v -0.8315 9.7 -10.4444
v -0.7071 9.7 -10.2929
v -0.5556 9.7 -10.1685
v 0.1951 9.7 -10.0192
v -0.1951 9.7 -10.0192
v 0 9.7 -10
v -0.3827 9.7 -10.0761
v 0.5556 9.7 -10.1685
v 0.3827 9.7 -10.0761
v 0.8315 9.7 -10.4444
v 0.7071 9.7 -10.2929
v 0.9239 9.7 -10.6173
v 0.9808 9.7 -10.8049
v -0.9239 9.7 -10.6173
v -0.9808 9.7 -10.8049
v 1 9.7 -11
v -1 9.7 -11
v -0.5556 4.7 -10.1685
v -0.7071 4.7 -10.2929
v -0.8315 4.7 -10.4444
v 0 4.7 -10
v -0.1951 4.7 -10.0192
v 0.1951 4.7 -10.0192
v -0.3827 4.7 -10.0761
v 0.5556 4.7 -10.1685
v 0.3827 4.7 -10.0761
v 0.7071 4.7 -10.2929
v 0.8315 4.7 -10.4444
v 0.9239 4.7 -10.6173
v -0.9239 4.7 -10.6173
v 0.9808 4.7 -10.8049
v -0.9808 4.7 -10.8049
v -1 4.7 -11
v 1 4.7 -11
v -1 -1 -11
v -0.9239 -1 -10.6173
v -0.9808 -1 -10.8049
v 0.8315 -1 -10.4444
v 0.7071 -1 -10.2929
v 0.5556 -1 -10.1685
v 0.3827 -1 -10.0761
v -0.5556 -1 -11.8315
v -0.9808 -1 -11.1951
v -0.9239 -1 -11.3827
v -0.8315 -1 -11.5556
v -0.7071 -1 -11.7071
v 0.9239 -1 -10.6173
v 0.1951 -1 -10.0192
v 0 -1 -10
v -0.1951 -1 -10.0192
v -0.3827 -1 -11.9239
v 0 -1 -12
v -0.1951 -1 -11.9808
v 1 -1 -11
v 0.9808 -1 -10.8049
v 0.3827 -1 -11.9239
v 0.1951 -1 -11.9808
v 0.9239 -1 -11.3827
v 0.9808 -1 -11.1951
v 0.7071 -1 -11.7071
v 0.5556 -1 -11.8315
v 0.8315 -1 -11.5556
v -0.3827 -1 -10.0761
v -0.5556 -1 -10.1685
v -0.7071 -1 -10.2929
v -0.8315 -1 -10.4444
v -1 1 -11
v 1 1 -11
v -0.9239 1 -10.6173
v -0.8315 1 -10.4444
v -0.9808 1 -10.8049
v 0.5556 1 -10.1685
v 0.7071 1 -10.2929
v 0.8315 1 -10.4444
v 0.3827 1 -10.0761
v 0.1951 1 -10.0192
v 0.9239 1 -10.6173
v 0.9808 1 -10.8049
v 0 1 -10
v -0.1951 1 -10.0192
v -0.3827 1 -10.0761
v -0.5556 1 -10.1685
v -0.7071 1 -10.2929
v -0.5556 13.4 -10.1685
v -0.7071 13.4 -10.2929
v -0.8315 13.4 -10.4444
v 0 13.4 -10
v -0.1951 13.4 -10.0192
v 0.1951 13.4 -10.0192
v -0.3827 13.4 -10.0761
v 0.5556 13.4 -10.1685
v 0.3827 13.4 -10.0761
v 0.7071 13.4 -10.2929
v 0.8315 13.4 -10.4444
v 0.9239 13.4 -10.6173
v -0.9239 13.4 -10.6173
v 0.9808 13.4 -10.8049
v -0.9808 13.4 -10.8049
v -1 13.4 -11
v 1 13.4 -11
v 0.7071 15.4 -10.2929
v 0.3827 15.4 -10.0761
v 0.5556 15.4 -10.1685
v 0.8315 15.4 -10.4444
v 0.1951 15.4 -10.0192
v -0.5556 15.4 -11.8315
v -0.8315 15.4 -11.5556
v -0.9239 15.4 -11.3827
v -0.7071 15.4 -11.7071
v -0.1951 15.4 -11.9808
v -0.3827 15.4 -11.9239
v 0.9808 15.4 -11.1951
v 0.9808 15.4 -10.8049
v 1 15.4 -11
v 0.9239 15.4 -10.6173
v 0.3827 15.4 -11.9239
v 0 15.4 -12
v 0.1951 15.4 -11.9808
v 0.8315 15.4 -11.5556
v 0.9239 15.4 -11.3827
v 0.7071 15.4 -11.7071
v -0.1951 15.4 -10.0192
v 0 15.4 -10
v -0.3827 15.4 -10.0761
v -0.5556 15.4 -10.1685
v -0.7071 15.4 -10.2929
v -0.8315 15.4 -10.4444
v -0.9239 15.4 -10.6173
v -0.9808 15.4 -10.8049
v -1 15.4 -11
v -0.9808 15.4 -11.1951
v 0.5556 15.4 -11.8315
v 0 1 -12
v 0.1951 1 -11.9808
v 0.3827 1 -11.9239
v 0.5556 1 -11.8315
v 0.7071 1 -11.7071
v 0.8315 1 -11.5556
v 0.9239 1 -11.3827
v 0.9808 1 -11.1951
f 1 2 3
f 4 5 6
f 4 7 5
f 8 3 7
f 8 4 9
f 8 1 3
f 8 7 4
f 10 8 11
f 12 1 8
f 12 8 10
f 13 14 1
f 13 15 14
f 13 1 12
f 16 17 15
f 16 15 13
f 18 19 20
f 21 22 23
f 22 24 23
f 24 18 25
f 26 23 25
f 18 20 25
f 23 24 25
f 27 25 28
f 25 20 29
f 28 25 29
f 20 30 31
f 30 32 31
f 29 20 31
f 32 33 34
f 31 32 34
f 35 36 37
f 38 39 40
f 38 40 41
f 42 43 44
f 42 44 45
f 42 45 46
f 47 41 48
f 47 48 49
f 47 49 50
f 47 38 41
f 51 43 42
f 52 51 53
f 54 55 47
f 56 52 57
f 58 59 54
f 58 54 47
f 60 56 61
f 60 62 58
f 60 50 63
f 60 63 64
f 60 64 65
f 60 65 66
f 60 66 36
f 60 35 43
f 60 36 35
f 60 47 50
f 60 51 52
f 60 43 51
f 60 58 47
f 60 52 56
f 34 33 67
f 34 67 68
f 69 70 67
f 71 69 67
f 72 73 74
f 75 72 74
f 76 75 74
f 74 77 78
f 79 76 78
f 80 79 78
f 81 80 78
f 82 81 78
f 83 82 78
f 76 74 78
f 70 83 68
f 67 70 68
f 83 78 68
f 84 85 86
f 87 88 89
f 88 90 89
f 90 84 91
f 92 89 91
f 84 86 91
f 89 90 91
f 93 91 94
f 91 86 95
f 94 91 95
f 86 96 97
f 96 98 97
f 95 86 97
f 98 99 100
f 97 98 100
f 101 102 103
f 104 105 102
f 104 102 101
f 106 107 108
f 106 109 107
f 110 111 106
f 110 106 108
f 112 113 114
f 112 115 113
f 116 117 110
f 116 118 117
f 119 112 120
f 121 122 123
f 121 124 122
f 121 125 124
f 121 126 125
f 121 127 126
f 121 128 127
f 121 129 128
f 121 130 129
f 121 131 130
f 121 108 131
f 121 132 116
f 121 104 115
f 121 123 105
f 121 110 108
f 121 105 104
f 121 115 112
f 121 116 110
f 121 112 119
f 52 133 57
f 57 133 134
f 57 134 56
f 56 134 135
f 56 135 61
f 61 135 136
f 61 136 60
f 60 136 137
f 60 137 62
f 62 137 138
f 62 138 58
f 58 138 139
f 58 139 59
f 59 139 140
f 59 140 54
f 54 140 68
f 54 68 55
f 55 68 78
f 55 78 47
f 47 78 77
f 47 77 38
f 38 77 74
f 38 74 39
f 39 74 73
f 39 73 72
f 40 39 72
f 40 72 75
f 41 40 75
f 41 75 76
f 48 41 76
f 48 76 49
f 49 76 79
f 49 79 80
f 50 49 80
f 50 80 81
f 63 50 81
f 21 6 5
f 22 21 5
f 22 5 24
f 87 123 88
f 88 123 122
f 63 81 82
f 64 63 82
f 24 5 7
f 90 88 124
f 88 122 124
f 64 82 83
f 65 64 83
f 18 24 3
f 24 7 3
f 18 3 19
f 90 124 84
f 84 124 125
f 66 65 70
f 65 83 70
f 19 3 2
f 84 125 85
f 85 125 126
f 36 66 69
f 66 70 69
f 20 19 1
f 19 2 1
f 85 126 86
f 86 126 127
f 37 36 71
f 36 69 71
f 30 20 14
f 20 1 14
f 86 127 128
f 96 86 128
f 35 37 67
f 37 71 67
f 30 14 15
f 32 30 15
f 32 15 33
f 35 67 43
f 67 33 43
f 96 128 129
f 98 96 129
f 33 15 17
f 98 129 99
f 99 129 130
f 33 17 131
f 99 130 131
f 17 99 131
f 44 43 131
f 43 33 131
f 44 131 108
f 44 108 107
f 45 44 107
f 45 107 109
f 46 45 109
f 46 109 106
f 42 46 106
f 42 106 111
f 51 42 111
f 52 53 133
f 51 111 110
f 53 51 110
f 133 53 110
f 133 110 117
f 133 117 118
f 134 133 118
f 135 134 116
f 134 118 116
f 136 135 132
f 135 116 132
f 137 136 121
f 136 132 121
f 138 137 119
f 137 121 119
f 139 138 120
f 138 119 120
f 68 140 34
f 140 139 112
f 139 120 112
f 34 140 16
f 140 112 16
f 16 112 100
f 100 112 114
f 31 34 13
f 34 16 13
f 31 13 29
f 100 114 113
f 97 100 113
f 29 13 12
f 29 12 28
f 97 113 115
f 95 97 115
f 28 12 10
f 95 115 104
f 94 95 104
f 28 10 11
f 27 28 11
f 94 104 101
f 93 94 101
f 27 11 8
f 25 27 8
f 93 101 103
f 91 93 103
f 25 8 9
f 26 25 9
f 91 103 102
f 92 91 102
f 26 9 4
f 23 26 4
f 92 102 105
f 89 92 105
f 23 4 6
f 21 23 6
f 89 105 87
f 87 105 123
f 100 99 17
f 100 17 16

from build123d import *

# Parameters (mm, degrees)
SKETCH1_R           = 13
BOSS_EXTRUDE1_DEPTH = 1
SKETCH16_R          = 13
BOSS_EXTRUDE3_DEPTH = 1
SKETCH19_R          = 1
BOSS_EXTRUDE4_DEPTH = 29.8
SKETCH18_W          = 22
SKETCH18_H          = 22
CUT_EXTRUDE6_DEPTH  = 3.7
SKETCH21_W          = 22
SKETCH21_H          = 22
CUT_EXTRUDE7_DEPTH  = 3.7
SKETCH22_R          = 11
CUT_EXTRUDE8_DEPTH  = 3.7
SKETCH23_R          = 11
CUT_EXTRUDE9_DEPTH  = 3.7
SKETCH24_R          = 19.921792127
CUT_EXTRUDE10_DEPTH = 1
SKETCH25_R          = 36.182885583
CUT_EXTRUDE11_DEPTH = 1
BOSS_EXTRUDE5_START = 2
BOSS_EXTRUDE5_DEPTH = 2
SKETCH27_R          = 1
BOSS_EXTRUDE6_DEPTH = 2
SKETCH28_R          = 9.676669919
CUT_EXTRUDE12_DEPTH = 17.4


with BuildPart() as part:
    # Sketch1 → Boss-Extrude1 (new body)
    with BuildSketch(Plane(origin=(0, 0, 0), x_dir=(1, 0, 0), z_dir=(0, 1, 0))):
        with Locations(Location((0, 0, 0), (0, 0, 270))):
            Circle(SKETCH1_R)
    extrude(amount=BOSS_EXTRUDE1_DEPTH)



with BuildPart() as body_2:
    # Sketch16 → Boss-Extrude3 (new body)
    with BuildSketch(Plane(origin=(0, 30.8, 0), x_dir=(1, 0, 0), z_dir=(0, 1, 0))):
        with Locations(Location((0, 0, 0), (0, 0, 270))):
            Circle(SKETCH16_R)
    extrude(amount=BOSS_EXTRUDE3_DEPTH)


with BuildPart() as part_1:
    add(part.part)

    add(body_2.part)  # Boss-Extrude4 merges body 2
    # Sketch19 → Boss-Extrude4 (add)
    with BuildSketch(Plane(origin=(0, 1, 0), x_dir=(1, 0, 0), z_dir=(0, 1, 0))):
        with Locations(Location((0, 11, 0), (0, 0, 270))):
            Circle(SKETCH19_R)
    extrude(amount=BOSS_EXTRUDE4_DEPTH)

    # Sketch18 → Cut-Extrude6 (cut)
    with BuildSketch(Plane(origin=(0, 4.7, 0), x_dir=(1, 0, 0), z_dir=(0, 1, 0))):
        Rectangle(SKETCH18_W, SKETCH18_H)
    extrude(amount=-CUT_EXTRUDE6_DEPTH, mode=Mode.SUBTRACT)

    # Sketch21 → Cut-Extrude7 (cut)
    with BuildSketch(Plane(origin=(0, 13.4, 0), x_dir=(1, 0, 0), z_dir=(0, 1, 0))):
        Rectangle(SKETCH21_W, SKETCH21_H)
    extrude(amount=-CUT_EXTRUDE7_DEPTH, mode=Mode.SUBTRACT)

    # Sketch22 → Cut-Extrude8 (cut)
    with BuildSketch(Plane(origin=(0, 22.1, 0), x_dir=(1, 0, 0), z_dir=(0, 1, 0))):
        Circle(SKETCH22_R)
    extrude(amount=-CUT_EXTRUDE8_DEPTH, mode=Mode.SUBTRACT)

    # Sketch23 → Cut-Extrude9 (cut)
    with BuildSketch(Plane(origin=(0, 30.8, 0), x_dir=(1, 0, 0), z_dir=(0, 1, 0))):
        Circle(SKETCH23_R)
    extrude(amount=-CUT_EXTRUDE9_DEPTH, mode=Mode.SUBTRACT)

    # Sketch24 → Cut-Extrude10 (cut)
    with BuildSketch(Plane(origin=(0, 31.8, 0), x_dir=(1, 0, 0), z_dir=(0, 1, 0))):
        Circle(SKETCH24_R)
    extrude(amount=-CUT_EXTRUDE10_DEPTH, mode=Mode.SUBTRACT)

    # Sketch25 → Cut-Extrude11 (cut)
    with BuildSketch(Plane(origin=(0, 1, 0), x_dir=(1, 0, 0), z_dir=(0, 1, 0))):
        Circle(SKETCH25_R)
    extrude(amount=-CUT_EXTRUDE11_DEPTH, mode=Mode.SUBTRACT)

    # Sketch26 → Boss-Extrude5 (add)
    with BuildSketch(Plane(origin=(0, 30.8, 0), x_dir=(1, 0, 0), z_dir=(0, 1, 0)).offset(BOSS_EXTRUDE5_START)):
        with BuildLine():
            ThreePointArc((-0.998966408, 10.954545455), (0, 11), (0.998966408, 10.954545455))
            ThreePointArc((0.998966408, 10.954545455), (0, 12), (-0.998966408, 10.954545455))
        make_face()
        with BuildLine():
            ThreePointArc((0.998966408, 10.954545455), (0.999741569, 10.977266852), (1, 11))
            ThreePointArc((1, 11), (-0.022733148, 11.999741569), (-0.998966408, 10.954545455))
            ThreePointArc((-0.998966408, 10.954545455), (0, 11), (0.998966408, 10.954545455))
        make_face()
        with BuildLine():
            ThreePointArc((0.998966408, 10.954545455), (0, 11), (-0.998966408, 10.954545455))
            ThreePointArc((-0.998966408, 10.954545455), (0, 10), (0.998966408, 10.954545455))
        make_face()
    extrude(amount=-BOSS_EXTRUDE5_DEPTH)

    # Sketch27 → Boss-Extrude6 (add)
    with BuildSketch(Plane.XZ.offset(-1)):
        with Locations(Location((0, -11, 0), (0, 0, 270))):
            Circle(SKETCH27_R)
    extrude(amount=BOSS_EXTRUDE6_DEPTH)

    # Sketch28 → Cut-Extrude12 (cut)
    with BuildSketch(Plane(origin=(0, 32.8, 0), x_dir=(1, 0, 0), z_dir=(0, 1, 0))):
        with Locations((0, 11)):
            Circle(SKETCH28_R)
    extrude(amount=-CUT_EXTRUDE12_DEPTH, mode=Mode.SUBTRACT)


solid = part_1.part
